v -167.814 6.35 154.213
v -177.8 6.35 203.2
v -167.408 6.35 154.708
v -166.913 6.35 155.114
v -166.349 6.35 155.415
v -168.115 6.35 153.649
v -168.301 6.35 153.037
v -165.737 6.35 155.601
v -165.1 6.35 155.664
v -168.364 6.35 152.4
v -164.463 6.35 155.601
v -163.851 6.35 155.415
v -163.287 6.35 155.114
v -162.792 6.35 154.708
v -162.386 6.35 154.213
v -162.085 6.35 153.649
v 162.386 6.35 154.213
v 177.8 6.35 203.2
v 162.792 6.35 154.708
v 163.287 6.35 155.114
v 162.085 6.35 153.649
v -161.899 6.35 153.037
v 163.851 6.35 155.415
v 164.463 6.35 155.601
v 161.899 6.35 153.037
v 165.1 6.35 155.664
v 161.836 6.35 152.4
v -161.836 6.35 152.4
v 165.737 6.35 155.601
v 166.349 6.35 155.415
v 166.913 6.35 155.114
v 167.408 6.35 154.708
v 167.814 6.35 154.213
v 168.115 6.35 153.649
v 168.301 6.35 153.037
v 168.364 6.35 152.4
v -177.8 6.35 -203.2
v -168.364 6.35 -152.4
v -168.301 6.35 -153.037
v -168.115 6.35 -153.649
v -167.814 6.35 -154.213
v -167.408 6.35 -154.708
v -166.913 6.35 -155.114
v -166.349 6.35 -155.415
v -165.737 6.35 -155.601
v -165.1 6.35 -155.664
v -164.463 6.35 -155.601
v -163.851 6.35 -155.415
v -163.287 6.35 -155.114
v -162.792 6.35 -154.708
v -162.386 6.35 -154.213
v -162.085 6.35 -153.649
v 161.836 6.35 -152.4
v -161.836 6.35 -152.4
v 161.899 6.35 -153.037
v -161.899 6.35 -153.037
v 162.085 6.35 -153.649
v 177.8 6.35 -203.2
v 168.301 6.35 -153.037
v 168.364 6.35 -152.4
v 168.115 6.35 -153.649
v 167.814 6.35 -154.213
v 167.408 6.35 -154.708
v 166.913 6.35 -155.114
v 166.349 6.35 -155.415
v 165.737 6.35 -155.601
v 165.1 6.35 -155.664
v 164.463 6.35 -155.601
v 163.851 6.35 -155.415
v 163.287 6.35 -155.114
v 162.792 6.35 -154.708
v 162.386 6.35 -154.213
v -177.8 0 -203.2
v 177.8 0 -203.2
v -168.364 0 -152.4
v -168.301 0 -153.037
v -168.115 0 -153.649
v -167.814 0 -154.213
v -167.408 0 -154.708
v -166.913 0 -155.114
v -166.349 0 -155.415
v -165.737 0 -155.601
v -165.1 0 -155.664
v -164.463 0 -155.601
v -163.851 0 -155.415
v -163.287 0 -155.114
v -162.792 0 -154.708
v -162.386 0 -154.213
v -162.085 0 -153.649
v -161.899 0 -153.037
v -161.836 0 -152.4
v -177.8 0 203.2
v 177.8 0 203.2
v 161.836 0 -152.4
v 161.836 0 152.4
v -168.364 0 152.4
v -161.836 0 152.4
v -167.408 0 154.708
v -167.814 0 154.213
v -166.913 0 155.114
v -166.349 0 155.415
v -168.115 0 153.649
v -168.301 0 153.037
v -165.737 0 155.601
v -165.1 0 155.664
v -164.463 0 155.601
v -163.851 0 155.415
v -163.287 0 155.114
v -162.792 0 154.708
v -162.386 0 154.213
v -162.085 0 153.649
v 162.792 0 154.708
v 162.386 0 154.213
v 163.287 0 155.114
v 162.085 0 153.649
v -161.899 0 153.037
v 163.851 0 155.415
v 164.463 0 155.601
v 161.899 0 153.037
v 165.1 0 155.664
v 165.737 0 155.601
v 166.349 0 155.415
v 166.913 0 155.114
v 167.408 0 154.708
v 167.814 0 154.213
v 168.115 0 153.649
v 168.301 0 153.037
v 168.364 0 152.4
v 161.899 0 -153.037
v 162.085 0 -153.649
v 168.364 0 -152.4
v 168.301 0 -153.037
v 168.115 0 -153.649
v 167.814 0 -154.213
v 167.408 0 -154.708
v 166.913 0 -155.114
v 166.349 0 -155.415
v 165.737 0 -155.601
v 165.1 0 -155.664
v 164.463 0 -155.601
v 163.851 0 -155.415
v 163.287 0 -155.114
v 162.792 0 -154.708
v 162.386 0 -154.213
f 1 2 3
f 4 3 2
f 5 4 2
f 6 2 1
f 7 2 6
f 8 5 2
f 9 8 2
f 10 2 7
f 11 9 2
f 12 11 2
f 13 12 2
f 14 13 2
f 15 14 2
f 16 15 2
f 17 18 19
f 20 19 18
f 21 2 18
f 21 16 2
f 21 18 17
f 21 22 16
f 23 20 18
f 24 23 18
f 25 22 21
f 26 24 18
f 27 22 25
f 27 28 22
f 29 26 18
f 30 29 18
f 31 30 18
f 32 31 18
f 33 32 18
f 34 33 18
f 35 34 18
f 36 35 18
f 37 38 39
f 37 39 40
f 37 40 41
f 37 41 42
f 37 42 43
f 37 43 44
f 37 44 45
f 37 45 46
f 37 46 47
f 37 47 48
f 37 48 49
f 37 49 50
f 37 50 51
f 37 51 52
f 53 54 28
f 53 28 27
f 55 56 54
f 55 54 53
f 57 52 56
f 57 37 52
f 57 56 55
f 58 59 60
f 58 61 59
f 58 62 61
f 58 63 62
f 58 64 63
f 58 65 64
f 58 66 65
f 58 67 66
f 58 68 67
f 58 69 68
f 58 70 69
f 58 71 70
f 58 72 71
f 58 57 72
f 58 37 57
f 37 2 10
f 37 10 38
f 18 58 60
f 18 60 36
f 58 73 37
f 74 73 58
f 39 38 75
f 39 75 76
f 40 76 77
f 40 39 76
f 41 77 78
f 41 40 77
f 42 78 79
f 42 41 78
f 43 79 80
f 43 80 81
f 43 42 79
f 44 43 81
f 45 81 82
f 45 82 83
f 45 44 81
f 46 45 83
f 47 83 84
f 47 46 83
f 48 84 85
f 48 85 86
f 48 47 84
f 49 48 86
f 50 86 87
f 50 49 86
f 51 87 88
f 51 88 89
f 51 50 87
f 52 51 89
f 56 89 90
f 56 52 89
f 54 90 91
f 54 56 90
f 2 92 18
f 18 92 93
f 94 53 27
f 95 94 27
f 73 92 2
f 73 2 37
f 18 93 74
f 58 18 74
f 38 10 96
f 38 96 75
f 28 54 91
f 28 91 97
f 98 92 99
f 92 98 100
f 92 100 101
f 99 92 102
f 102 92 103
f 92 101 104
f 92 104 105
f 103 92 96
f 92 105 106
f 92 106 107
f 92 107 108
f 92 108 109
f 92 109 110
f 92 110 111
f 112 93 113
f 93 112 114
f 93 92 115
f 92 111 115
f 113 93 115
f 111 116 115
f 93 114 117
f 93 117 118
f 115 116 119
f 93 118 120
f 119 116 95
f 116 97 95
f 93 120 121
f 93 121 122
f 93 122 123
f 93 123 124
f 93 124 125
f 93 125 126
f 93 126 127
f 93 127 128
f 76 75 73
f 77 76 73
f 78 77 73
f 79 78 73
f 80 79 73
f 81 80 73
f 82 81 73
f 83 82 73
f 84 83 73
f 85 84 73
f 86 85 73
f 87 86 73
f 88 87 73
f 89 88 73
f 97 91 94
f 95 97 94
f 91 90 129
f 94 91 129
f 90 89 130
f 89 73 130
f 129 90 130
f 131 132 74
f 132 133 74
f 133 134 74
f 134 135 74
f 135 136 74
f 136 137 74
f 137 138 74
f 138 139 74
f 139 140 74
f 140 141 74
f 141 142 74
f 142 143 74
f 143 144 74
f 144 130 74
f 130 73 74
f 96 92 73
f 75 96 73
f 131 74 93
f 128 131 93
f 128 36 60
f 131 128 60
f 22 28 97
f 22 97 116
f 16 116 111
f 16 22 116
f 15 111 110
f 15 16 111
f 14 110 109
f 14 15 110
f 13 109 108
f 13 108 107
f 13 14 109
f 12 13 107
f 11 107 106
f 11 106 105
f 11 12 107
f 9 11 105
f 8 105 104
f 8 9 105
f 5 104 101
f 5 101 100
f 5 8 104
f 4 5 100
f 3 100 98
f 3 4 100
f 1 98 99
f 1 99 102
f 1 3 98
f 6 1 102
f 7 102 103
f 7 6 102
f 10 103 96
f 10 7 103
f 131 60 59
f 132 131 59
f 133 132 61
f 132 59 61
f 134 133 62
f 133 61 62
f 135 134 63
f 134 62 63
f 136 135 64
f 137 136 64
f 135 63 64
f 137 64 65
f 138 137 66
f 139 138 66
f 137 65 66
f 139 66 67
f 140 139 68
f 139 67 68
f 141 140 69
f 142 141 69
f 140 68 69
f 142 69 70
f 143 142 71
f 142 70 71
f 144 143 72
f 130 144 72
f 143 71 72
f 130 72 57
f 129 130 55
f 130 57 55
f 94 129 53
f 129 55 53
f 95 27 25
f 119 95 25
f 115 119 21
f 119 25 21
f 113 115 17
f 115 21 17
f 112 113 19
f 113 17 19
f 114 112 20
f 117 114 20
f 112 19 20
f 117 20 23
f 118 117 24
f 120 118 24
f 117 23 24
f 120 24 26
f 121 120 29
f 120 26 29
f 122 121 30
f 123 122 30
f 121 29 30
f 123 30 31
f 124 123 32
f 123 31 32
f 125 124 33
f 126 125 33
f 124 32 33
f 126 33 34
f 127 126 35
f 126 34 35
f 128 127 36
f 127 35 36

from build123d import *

# Parameters (mm, degrees)
SKETCH1_W           = 355.6
SKETCH1_H           = 406.4
BOSS_EXTRUDE1_DEPTH = 6.35
CUT_EXTRUDE1_DEPTH  = 6.35


with BuildPart() as part:
    # Sketch1 → Boss-Extrude1 (new body)
    with BuildSketch(Plane(origin=(0, 0, 0), x_dir=(1, 0, 0), z_dir=(0, 1, 0))):
        Rectangle(SKETCH1_W, SKETCH1_H)
    extrude(amount=BOSS_EXTRUDE1_DEPTH)

    # Sketch2 → Cut-Extrude1 (cut)
    with BuildSketch(Plane(origin=(0, 6.35, 0), x_dir=(1, 0, 0), z_dir=(0, 1, 0))):
        with BuildLine():
            Line((-161.8361, 152.4), (-161.8361, -152.4))
            ThreePointArc((-161.8361, -152.4), (-165.1, -155.6639), (-168.3639, -152.4))
            Line((-168.3639, -152.4), (-168.3639, 152.4))
            ThreePointArc((-168.3639, 152.4), (-165.1, 155.6639), (-161.8361, 152.4))
        make_face()
    cut_extrude1 = extrude(amount=-CUT_EXTRUDE1_DEPTH, mode=Mode.SUBTRACT)

    # Mirror1: Cut-Extrude1 across plane
    add(cut_extrude1.mirror(Plane(origin=(0, 0, 0), x_dir=(0, 0, 1), z_dir=(1, 0, 0))), mode=Mode.SUBTRACT)


solid = part.part
